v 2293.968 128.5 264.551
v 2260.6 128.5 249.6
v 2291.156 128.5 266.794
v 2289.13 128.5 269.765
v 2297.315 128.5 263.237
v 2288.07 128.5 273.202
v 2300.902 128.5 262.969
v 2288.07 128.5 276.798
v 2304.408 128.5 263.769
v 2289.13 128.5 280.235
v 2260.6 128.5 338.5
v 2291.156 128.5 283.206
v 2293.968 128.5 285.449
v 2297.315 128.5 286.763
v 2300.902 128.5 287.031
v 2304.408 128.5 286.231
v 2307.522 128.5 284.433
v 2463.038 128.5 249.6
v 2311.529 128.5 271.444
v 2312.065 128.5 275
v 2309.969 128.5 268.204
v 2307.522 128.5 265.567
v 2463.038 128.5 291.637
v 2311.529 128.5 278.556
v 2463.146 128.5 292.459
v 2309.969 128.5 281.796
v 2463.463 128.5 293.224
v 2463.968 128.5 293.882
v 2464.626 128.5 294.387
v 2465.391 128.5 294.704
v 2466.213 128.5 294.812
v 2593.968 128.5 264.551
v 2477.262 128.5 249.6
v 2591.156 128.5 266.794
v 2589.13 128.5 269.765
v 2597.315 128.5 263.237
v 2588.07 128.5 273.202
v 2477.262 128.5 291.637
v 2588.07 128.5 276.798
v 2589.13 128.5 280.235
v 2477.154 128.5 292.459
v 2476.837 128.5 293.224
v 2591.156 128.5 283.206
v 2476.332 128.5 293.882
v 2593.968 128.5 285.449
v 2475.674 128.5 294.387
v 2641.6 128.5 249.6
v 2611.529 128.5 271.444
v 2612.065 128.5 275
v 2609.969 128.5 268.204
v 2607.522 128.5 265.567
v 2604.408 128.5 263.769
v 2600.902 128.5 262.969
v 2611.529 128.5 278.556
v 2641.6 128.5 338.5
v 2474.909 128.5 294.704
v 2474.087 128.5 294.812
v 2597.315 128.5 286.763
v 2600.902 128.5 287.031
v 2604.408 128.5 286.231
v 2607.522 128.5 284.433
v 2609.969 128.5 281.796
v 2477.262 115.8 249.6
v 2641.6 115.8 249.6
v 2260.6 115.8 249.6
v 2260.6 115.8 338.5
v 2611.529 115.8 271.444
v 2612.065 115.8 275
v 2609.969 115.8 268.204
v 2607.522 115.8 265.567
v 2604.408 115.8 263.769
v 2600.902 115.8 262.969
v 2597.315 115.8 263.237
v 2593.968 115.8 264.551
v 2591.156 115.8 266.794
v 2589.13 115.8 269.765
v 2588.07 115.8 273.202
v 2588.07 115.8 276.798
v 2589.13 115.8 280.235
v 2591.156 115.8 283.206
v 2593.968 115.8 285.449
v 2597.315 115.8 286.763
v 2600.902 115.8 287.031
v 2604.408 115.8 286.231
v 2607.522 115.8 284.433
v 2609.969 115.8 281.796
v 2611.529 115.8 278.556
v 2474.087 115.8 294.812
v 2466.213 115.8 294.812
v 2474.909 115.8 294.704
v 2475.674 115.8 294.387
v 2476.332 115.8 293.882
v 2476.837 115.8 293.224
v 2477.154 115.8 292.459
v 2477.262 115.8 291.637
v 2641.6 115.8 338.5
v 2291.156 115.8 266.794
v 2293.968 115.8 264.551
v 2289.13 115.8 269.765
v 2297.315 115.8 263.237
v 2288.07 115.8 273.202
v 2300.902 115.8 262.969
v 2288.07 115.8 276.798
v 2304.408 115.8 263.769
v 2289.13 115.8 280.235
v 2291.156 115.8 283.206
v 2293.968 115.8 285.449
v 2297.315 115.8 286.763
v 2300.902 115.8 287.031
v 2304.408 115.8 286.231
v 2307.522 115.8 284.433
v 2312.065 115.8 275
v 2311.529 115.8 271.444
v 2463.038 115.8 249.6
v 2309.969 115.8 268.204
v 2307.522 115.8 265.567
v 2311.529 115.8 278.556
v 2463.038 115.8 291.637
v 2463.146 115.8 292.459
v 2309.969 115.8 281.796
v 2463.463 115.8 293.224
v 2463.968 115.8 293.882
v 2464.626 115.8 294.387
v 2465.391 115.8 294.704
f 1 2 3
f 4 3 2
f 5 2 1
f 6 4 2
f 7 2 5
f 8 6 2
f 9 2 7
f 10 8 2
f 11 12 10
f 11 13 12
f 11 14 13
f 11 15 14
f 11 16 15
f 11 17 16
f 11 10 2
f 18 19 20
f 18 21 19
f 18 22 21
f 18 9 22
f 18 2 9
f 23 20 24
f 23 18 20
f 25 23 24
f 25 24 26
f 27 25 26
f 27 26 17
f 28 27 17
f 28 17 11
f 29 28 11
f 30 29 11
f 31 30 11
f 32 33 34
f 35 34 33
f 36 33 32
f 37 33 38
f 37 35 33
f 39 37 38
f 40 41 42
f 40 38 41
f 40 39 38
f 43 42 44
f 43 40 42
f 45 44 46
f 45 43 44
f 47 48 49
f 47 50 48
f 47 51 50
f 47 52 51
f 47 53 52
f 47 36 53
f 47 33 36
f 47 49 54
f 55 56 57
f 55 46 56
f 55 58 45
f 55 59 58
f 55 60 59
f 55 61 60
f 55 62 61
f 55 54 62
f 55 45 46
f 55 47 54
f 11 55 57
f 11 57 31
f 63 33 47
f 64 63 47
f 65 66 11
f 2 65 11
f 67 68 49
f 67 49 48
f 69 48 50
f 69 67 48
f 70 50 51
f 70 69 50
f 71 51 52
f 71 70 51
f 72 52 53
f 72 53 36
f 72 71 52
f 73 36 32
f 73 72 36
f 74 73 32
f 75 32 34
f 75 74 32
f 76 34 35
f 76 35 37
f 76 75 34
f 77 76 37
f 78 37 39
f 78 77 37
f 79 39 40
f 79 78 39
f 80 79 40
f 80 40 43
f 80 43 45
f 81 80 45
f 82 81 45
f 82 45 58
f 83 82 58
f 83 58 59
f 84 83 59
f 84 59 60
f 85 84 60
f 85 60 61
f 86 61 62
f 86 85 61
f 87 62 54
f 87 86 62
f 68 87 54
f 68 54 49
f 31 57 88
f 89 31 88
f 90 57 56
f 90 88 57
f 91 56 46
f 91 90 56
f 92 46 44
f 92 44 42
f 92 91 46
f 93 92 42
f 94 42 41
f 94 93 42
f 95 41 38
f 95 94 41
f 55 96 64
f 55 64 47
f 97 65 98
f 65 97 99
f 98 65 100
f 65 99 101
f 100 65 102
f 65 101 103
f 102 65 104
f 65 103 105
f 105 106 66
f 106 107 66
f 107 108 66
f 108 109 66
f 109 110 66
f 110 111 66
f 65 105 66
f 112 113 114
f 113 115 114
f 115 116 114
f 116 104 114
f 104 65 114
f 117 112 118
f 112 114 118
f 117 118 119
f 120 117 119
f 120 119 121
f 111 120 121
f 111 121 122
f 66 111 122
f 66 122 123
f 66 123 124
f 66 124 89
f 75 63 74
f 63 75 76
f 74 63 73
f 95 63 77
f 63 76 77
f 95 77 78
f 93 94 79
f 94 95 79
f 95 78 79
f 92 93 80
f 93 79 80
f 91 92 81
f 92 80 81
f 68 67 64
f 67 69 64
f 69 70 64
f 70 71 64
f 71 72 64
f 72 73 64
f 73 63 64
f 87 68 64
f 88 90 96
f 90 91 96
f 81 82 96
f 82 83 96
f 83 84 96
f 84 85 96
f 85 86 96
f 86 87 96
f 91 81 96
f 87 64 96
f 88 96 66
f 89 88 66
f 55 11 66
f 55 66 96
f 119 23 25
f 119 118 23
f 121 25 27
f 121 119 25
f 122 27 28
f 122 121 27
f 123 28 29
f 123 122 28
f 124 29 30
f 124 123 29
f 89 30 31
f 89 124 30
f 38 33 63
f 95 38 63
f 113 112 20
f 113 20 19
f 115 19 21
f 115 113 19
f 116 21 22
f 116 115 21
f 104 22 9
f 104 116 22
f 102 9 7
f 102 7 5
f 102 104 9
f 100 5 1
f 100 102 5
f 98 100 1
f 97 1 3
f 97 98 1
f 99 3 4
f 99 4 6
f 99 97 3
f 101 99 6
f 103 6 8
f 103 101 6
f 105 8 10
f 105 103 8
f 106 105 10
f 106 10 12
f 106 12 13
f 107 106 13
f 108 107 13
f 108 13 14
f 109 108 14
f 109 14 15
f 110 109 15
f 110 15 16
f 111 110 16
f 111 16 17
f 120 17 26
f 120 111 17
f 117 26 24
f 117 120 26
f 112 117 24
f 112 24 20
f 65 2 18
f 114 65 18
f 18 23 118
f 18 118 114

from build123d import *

# Parameters (mm, degrees)
BOSS_EXTRUDE1_DEPTH      = 50.8
BOSS_EXTRUDE1_DEPTH_BACK = 38.1
SKETCH2_W                = 381
SKETCH2_H                = 12.7
SKETCH3_W                = 12.7
SKETCH3_H                = 44.45
CUT_EXTRUDE1_DEPTH       = 2664.230012597
CAVITY1_START            = 115.8
CAVITY1_OUTLINE_R        = 12.7
CAVITY1_DEPTH            = 12.7
MOVE_FACE_HOLES_BY       = 0.635
MOVE_FACE_HOLES_2_BY     = 0.635
MOVE_FACE2_BY            = 0.762
MOVE_FACE2_2_BY          = 0.762
MOVE_FACE2_3_BY          = 0.762
SLOT_FILLET_R            = 3.175


# Read off the part's stored shape, not the designer's step: Cavity1
with BuildPart() as part:
    # Sketch2 → Boss-Extrude1 (new, two sides: drawn at the far end of the back side and taken through both)
    with BuildSketch(Plane.XY.offset(287.7).offset(-BOSS_EXTRUDE1_DEPTH_BACK)):
        with Locations((2451.1, 122.15)):
            Rectangle(SKETCH2_W, SKETCH2_H)
    extrude(amount=BOSS_EXTRUDE1_DEPTH + BOSS_EXTRUDE1_DEPTH_BACK)

    # Sketch3 → Cut-Extrude1 (cut, through all)
    with BuildSketch(Plane(origin=(0, 128.5, 0), x_dir=(1, 0, 0), z_dir=(0, 1, 0))):
        with Locations((2470.15, -271.825)):
            Rectangle(SKETCH3_W, SKETCH3_H)
    extrude(amount=-CUT_EXTRUDE1_DEPTH, mode=Mode.SUBTRACT)

    # Cavity1 outline → Cavity1 (cut)
    with BuildSketch(Plane(origin=(0, 0, 0), x_dir=(1, 0, 0), z_dir=(0, 1, 0)).offset(CAVITY1_START)):
        with Locations((2300, -275)):
            Circle(CAVITY1_OUTLINE_R)
        with Locations((2600, -275)):
            Circle(CAVITY1_OUTLINE_R)
    extrude(amount=CAVITY1_DEPTH, mode=Mode.SUBTRACT)

    # Move Face Holes: a curved face moved outward by 0.635
    add(Solid.thicken(part.faces().sort_by_distance((2587.3, 122.15, 275))[0], MOVE_FACE_HOLES_BY))

    # Move Face Holes 2: a curved face moved outward by 0.635
    add(Solid.thicken(part.faces().sort_by_distance((2287.3, 122.15, 275))[0], MOVE_FACE_HOLES_2_BY))

    # Move Face2: a face moved inward by 0.762
    extrude(part.faces().sort_by_distance((2470.15, 122.15, 294.05))[0], amount=MOVE_FACE2_BY, dir=(0, 0, 1), mode=Mode.SUBTRACT)

    # Move Face2 2: a face moved inward by 0.762
    extrude(part.faces().sort_by_distance((2476.5, 122.15, 271.825))[0], amount=MOVE_FACE2_2_BY, dir=(1, 0, 0), mode=Mode.SUBTRACT)

    # Move Face2 3: a face moved inward by 0.762
    extrude(part.faces().sort_by_distance((2463.8, 122.15, 271.825))[0], amount=MOVE_FACE2_3_BY, dir=(-1, 0, 0), mode=Mode.SUBTRACT)

    # Slot Fillet
    slot_fillet_edges = [part.edges().sort_by_distance(p)[0] for p in [
        (2477.262, 122.15, 294.812),
        (2463.038, 122.15, 294.812),
    ]]
    fillet(slot_fillet_edges, radius=SLOT_FILLET_R)


solid = part.part
